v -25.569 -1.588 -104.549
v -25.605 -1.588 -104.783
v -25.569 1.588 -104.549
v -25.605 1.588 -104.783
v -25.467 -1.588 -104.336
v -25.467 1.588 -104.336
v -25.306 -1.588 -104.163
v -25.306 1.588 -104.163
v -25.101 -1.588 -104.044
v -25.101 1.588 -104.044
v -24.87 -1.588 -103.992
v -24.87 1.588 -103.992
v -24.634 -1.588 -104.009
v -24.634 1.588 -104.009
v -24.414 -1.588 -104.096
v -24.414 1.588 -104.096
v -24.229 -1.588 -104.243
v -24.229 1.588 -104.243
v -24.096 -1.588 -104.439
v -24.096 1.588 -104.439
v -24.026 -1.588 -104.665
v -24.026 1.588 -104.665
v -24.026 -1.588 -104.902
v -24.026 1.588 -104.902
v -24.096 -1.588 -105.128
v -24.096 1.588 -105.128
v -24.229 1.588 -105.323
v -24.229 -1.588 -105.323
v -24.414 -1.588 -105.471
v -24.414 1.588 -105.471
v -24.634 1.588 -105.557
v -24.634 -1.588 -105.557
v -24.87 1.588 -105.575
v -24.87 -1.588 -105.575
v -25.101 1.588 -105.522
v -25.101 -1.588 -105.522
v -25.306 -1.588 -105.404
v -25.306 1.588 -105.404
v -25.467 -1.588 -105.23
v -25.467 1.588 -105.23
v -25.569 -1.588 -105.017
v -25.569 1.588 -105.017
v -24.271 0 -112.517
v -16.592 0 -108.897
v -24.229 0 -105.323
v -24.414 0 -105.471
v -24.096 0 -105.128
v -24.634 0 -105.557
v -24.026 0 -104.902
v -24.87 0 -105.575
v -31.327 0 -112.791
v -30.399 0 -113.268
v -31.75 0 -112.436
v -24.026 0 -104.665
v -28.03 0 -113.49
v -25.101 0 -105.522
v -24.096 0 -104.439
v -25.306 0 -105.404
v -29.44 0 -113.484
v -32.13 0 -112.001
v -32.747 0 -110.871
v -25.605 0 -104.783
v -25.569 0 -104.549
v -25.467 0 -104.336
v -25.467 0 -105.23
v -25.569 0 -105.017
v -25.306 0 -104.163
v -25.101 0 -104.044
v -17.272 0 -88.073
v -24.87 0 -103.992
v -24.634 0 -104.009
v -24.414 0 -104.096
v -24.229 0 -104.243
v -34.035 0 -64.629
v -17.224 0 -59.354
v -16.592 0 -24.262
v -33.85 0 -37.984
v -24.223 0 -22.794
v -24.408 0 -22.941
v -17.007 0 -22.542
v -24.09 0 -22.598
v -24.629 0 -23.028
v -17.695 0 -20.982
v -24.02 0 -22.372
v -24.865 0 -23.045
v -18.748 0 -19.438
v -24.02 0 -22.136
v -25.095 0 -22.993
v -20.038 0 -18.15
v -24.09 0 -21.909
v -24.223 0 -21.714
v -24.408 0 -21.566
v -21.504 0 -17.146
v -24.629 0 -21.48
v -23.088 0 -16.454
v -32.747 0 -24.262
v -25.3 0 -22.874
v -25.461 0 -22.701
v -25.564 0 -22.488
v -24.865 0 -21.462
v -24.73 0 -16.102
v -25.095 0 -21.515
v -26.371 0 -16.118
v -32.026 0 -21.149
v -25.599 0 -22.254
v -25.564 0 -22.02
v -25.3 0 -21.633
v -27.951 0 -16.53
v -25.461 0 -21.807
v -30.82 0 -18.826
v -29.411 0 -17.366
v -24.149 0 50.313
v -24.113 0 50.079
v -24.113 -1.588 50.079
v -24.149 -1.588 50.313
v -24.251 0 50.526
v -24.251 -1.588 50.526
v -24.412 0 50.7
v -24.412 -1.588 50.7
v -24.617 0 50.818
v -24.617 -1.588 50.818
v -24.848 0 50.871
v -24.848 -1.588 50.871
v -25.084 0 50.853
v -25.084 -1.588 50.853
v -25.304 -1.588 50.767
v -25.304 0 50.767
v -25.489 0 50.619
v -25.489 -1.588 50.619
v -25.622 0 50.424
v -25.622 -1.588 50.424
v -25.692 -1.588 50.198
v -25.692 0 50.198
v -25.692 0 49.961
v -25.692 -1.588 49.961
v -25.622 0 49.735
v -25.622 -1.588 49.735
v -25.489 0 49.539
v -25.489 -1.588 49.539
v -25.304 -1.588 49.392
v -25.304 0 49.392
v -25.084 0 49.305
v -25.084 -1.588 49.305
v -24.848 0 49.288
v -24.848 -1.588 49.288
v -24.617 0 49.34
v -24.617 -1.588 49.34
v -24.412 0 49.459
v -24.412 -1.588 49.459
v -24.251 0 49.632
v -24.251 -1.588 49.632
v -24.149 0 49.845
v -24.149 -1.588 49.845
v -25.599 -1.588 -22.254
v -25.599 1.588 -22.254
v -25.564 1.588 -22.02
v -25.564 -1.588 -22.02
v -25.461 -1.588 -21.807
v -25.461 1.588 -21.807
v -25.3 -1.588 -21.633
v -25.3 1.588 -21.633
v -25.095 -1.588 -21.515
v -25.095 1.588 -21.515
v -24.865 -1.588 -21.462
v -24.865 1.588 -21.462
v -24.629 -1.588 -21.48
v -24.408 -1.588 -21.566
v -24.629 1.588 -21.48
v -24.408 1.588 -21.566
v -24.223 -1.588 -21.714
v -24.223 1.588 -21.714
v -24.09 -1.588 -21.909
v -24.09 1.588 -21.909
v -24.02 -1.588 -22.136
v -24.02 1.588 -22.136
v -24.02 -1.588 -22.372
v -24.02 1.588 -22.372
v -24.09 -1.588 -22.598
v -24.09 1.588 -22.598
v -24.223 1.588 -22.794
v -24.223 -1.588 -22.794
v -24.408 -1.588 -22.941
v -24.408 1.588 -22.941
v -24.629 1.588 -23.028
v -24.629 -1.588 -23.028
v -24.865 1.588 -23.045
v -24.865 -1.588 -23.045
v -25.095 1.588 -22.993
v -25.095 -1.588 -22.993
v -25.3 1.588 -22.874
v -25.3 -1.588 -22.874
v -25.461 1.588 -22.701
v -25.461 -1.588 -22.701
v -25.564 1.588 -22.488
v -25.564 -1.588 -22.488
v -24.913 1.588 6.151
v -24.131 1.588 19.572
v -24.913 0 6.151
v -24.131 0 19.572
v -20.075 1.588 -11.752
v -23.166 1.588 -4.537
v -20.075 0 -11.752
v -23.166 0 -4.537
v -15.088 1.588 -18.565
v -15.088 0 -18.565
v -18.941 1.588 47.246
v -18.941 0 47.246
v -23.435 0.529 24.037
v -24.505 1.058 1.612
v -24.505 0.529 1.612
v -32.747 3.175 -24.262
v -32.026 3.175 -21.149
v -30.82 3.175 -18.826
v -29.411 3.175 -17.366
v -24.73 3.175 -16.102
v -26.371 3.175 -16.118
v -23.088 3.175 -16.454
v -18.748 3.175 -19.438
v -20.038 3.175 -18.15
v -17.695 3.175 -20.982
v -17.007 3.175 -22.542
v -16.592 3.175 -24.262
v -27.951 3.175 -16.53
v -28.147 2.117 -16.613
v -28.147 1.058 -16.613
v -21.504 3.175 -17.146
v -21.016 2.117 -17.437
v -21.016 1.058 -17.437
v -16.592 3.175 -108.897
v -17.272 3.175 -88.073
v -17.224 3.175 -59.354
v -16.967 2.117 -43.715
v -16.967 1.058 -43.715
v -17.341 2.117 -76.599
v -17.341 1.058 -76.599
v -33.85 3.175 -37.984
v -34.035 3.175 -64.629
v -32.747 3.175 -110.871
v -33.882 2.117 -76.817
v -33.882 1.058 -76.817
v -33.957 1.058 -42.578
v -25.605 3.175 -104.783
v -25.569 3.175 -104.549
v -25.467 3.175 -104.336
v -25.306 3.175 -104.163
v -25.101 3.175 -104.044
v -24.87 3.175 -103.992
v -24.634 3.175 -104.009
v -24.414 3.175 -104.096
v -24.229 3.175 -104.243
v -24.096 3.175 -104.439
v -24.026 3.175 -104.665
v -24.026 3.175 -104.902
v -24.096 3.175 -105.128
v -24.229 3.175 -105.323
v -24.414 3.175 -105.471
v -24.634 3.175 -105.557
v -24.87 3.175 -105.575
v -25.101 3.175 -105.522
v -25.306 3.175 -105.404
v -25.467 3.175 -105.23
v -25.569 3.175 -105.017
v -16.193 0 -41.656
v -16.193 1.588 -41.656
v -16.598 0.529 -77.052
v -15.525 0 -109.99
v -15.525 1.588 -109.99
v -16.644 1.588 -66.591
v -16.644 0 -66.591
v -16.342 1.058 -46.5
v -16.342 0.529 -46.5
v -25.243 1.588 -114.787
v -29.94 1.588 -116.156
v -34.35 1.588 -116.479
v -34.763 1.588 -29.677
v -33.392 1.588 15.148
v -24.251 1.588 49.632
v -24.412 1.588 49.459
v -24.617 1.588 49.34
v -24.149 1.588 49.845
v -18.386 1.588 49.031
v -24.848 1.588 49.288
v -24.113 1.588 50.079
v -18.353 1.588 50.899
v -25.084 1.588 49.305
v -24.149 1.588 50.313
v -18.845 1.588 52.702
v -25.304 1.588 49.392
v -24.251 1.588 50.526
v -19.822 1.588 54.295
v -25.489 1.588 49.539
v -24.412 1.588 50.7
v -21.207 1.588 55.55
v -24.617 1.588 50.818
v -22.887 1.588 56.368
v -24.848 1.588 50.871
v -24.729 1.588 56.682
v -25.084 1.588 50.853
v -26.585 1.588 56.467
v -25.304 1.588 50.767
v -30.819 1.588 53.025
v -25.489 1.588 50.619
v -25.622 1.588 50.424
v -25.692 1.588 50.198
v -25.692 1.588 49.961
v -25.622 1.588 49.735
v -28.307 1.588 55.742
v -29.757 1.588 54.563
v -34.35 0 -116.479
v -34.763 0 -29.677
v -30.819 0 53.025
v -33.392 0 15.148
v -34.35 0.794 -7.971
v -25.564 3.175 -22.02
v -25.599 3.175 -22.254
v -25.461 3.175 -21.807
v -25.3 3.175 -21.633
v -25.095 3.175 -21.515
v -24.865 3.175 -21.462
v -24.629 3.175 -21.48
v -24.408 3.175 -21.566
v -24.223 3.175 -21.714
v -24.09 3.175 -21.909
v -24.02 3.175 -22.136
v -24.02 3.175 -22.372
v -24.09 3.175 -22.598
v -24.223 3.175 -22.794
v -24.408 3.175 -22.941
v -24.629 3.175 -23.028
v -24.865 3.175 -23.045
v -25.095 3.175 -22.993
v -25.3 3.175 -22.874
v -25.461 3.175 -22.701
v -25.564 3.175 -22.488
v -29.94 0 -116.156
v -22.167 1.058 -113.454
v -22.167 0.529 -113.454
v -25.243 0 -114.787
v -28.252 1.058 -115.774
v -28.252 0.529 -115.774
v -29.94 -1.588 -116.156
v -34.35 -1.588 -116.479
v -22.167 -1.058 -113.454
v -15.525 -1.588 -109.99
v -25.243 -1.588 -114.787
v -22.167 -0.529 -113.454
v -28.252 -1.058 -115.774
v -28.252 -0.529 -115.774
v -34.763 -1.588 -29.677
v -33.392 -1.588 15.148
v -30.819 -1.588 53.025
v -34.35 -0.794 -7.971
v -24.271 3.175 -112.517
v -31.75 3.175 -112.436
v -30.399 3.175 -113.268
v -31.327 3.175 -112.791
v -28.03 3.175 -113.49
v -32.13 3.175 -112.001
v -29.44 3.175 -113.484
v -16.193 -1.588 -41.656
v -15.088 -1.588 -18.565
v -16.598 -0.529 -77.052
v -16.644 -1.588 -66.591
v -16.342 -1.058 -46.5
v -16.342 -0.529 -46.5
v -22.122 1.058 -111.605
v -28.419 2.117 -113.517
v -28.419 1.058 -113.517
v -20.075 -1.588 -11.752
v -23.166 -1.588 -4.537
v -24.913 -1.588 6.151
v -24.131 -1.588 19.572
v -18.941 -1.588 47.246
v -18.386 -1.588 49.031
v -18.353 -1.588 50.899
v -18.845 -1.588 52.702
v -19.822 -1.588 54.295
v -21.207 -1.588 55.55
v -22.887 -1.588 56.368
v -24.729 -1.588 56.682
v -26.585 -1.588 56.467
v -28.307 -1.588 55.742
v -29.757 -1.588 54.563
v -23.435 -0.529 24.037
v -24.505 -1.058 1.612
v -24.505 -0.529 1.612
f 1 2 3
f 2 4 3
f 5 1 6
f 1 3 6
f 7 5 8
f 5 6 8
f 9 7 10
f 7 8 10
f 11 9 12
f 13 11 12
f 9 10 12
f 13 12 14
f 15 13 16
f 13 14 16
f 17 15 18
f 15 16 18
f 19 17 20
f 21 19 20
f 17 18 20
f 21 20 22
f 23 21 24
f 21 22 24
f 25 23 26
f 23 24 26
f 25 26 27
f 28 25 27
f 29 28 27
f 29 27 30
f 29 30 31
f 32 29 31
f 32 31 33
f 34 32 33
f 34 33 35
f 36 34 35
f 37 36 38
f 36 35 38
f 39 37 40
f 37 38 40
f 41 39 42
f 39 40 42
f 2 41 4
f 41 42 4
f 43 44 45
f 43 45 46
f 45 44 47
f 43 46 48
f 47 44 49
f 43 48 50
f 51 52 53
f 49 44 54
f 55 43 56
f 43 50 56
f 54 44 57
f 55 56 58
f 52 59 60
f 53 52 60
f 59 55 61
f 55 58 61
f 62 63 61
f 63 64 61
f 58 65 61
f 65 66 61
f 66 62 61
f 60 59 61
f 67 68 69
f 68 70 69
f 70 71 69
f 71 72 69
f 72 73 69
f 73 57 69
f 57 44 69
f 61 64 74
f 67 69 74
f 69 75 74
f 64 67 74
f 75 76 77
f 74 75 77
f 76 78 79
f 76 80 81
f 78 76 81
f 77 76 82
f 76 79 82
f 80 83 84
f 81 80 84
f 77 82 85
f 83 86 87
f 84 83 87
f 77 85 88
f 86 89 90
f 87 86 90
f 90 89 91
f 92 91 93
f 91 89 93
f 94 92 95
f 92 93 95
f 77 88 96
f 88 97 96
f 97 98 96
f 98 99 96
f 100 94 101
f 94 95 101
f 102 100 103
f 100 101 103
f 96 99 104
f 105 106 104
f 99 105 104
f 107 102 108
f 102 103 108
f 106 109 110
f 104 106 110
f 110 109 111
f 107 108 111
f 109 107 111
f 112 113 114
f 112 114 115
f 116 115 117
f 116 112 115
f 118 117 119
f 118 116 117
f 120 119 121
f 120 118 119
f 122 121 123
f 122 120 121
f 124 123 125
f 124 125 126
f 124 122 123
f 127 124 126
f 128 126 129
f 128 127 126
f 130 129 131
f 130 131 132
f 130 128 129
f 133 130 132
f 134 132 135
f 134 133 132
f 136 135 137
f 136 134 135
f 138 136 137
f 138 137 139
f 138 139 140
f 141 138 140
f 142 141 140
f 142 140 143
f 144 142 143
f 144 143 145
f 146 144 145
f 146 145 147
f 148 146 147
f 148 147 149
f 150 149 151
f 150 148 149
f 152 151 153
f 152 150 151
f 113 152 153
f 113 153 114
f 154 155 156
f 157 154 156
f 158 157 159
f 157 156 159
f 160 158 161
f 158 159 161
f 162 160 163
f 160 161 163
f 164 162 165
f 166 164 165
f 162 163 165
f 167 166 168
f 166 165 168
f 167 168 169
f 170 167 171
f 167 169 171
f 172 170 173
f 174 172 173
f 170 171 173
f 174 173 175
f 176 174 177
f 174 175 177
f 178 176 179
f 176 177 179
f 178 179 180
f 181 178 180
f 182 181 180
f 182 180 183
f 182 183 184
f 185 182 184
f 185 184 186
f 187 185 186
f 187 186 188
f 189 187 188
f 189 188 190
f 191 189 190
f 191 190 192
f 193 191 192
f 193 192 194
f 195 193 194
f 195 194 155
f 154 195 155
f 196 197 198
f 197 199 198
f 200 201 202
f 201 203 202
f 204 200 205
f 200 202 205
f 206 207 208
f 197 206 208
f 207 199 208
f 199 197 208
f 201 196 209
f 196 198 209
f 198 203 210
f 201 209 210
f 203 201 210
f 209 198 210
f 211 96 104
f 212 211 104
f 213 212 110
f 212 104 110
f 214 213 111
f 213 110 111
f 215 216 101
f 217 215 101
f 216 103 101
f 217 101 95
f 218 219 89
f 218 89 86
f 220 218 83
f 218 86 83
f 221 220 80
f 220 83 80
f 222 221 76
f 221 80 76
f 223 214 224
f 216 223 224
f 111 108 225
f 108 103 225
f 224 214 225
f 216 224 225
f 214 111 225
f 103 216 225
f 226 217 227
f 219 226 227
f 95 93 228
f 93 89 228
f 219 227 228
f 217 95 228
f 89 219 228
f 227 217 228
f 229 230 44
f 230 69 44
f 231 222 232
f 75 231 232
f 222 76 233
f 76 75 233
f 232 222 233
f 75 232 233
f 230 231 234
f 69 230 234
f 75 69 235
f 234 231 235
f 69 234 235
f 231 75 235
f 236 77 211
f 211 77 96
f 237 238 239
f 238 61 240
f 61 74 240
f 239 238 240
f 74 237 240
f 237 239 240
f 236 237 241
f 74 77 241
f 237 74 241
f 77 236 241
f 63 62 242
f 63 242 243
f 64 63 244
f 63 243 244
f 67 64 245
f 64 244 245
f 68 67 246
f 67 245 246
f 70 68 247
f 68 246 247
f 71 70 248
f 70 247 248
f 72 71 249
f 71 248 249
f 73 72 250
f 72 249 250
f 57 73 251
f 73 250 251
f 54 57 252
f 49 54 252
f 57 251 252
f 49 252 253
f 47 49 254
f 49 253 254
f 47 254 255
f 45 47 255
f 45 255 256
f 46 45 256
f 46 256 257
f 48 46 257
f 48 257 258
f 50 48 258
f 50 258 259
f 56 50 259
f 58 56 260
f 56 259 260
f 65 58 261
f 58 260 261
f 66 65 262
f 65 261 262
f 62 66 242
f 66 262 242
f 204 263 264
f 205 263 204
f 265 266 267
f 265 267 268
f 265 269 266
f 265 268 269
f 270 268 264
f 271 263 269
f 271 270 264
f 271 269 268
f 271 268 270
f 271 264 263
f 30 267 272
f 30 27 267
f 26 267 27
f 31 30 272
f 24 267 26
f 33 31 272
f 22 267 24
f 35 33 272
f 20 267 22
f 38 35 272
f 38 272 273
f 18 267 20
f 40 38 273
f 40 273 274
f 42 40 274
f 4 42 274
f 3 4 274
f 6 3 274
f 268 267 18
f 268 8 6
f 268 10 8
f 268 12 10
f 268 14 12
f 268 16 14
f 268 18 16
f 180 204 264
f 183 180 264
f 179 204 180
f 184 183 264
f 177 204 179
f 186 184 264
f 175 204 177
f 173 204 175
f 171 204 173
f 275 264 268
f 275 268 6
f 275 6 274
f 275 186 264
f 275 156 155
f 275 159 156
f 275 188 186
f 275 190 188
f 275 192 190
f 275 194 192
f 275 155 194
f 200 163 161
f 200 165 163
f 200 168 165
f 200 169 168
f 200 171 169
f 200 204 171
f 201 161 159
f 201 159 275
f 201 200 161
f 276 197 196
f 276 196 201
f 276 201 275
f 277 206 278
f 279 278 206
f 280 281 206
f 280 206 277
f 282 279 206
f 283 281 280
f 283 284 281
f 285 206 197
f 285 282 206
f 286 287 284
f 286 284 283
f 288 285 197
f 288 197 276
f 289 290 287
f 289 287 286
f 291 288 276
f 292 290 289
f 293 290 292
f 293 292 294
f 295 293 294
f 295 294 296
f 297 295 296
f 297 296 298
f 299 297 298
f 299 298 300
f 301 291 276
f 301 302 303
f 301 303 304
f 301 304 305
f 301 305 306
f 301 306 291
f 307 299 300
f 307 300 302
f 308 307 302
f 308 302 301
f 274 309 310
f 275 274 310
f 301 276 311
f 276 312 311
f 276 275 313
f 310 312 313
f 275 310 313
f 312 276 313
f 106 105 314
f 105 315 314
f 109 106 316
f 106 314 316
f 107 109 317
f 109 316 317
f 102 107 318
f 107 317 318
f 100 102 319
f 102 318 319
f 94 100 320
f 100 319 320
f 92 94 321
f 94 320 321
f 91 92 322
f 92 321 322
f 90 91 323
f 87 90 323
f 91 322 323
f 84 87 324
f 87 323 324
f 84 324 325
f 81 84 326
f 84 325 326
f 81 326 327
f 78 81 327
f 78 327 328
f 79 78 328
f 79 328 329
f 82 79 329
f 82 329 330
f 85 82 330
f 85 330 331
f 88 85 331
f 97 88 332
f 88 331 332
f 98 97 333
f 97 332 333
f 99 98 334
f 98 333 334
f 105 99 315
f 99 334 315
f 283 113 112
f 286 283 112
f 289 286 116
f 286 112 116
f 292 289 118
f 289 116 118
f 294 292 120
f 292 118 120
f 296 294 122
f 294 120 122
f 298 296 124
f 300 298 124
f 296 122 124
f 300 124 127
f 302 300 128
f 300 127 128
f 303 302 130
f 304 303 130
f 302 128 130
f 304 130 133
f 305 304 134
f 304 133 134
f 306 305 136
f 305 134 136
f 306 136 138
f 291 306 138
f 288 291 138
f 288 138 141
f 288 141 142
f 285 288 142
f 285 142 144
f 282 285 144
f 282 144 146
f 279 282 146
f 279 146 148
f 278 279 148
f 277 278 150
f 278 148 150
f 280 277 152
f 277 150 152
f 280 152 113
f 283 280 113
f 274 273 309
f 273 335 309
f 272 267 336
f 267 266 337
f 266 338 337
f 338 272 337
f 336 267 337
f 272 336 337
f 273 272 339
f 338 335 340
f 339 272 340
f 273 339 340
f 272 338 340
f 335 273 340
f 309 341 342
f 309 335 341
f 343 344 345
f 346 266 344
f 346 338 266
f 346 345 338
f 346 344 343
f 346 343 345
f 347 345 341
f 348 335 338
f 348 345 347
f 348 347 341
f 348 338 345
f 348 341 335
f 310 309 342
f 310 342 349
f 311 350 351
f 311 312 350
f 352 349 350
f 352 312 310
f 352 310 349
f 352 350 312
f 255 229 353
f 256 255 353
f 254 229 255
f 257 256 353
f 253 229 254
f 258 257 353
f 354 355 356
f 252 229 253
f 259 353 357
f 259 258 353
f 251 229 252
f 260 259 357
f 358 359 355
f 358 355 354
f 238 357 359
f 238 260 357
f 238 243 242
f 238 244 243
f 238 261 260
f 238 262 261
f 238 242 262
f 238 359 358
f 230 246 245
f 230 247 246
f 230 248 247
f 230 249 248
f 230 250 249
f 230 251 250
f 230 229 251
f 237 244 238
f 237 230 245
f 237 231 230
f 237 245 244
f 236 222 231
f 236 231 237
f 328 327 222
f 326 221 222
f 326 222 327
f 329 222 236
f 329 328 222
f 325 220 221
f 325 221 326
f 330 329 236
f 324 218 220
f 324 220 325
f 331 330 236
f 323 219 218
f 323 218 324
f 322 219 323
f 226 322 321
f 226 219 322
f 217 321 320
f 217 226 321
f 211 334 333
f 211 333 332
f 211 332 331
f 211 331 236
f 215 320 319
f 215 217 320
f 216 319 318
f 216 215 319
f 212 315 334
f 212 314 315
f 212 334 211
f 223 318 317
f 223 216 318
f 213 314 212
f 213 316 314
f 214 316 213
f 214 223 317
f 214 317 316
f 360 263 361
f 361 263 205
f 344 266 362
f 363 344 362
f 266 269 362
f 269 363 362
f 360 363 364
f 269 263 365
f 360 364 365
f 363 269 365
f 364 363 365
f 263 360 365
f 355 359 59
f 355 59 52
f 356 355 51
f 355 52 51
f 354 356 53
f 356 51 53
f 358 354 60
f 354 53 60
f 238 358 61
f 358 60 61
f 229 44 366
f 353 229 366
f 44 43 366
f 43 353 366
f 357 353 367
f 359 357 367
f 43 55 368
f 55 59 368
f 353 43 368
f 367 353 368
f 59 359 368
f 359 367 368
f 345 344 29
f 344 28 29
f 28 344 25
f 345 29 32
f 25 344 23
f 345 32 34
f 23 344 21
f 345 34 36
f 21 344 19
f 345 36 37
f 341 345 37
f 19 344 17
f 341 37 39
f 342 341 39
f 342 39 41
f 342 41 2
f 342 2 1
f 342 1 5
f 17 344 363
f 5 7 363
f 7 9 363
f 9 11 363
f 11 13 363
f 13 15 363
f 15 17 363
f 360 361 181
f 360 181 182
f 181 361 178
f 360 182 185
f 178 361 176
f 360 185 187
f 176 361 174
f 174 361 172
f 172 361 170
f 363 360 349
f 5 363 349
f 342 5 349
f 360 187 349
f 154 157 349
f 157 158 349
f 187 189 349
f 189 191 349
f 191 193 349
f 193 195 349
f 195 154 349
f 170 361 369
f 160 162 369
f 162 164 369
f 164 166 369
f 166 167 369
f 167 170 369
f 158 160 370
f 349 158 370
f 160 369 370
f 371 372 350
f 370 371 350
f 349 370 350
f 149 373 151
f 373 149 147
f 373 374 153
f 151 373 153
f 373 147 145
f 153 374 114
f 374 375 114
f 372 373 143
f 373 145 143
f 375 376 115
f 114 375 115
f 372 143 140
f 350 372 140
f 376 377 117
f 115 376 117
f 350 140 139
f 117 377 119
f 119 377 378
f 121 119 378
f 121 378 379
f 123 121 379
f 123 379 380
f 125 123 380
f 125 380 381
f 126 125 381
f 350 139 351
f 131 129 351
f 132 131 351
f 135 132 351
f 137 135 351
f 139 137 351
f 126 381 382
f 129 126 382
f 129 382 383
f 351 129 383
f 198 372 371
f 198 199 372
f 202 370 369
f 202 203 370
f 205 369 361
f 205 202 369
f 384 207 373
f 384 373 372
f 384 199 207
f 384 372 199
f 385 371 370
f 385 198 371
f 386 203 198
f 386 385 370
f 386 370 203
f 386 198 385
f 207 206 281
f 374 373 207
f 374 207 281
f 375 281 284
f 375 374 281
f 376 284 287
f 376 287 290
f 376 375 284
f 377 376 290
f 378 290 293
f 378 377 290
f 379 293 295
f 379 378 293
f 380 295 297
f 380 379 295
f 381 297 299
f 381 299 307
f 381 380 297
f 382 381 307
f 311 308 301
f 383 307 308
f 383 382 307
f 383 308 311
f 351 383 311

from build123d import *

# Parameters (mm, degrees)
F0_R     = 0.79375
F1_DEPTH = 1.5875
F3_DEPTH = 3.175
F4_R     = 0.79375
F5_DEPTH = 12.7


with BuildPart() as f1:
    # F0 (on Front) → F1 (new body, symmetric)
    with BuildSketch(Plane.XZ):
        with BuildLine():
            add(Edge.make_bspline(
                [(-34.3502052128, -116.479113698), (-34.7983030784, -77.7177502952), (-35.5826450176, -9.87060067), (-32.2482955411, 34.1522766481), (-30.8188740164, 53.0246980488)],
                knots=[0, 0, 0, 0, 0.5713042275, 1, 1, 1, 1], degree=3))
            add(Edge.make_bspline(
                [(-15.5250038952, -109.9904626608), (-22.6352680475, -113.8694807887), (-28.0549824238, -116.7387440801), (-34.3502052128, -116.479113698)],
                knots=[0, 0, 0, 0, 19.9120766605, 19.9120766605, 19.9120766605, 19.9120766605], degree=3))
            add(Edge.make_bspline(
                [(-15.5250038952, -109.9904626608), (-17.3721220344, -75.9345591068), (-16.7300663888, -45.1156832278), (-15.0884054601, -18.5649804771)],
                knots=[0, 0, 0, 0, 91.4265246562, 91.4265246562, 91.4265246562, 91.4265246562], degree=3))
            add(Edge.make_bspline(
                [(-18.9407654107, 47.2461543977), (-22.7931253612, 24.1320021451), (-32.1029946208, 0), (-15.0884054601, -18.5649804771)],
                knots=[0, 0, 0, 0, 65.9237904758, 65.9237904758, 65.9237904758, 65.9237904758], degree=3))
            ThreePointArc((-18.9407654107, 47.2461543977), (-22.0177139024, 56.0186393162), (-30.8188740164, 53.0246980488))
        make_face()
        with Locations((-24.9071146526, 50.0793200016)):
            Circle(F0_R, mode=Mode.SUBTRACT)
    extrude(amount=F1_DEPTH, both=True)


with BuildPart() as f3:
    # F2 (on Front) → F3 (new body)
    with BuildSketch(Plane.XZ):
        with BuildLine():
            add(Edge.make_bspline(
                [(-16.5921431035, -108.8966056705), (-20.8282601088, -110.7499077916), (-30.3135253489, -117.0494705439), (-32.7472798526, -110.8714863658)],
                knots=[0, 0, 0, 0, 16.2753985249, 16.2753985249, 16.2753985249, 16.2753985249], degree=3))
            add(Edge.make_bspline(
                [(-16.5921431035, -24.2616645992), (-16.5921431035, -32.3270261288), (-18.2770490646, -81.5637037158), (-16.5921431035, -108.8966056705)],
                knots=[0, 0, 0, 0, 84.6349410713, 84.6349410713, 84.6349410713, 84.6349410713], degree=3))
            add(Edge.make_bspline(
                [(-32.7472798526, -24.2616645992), (-31.158734113, -11.5533126518), (-17.9159287363, -15.2599150315), (-16.5921431035, -24.2616645992)],
                knots=[0, 0, 0, 0, 16.1551367491, 16.1551367491, 16.1551367491, 16.1551367491], degree=3))
            add(Edge.make_bspline(
                [(-32.7472798526, -110.8714863658), (-34.335821867, -82.277700305), (-34.6743278205, -29.247187078), (-32.7472798526, -24.2616645992)],
                knots=[0, 0, 0, 0, 86.6098217666, 86.6098217666, 86.6098217666, 86.6098217666], degree=3))
        make_face()
    extrude(amount=-F3_DEPTH)


with BuildPart() as f5_tool:
    # F4 (on face) → F5 (new body, symmetric)
    with BuildSketch(Plane(origin=(0, 1.5875, 0), x_dir=(-1, 0, 0), z_dir=(0, 1, 0))):
        with Locations((24.8052769176, -22.2538337111)):
            Circle(F4_R)
        with Locations((24.8107649386, -104.7833412886)):
            Circle(F4_R)
    extrude(amount=F5_DEPTH, both=True)


with BuildPart() as f1_1:
    add(f1.part)

    # F5: cut by f5_tool
    add(f5_tool.part, mode=Mode.SUBTRACT)


with BuildPart() as f3_1:
    add(f3.part)

    # F5: cut by f5_tool
    add(f5_tool.part, mode=Mode.SUBTRACT)


solid = Compound([f1_1.part, f3_1.part])
